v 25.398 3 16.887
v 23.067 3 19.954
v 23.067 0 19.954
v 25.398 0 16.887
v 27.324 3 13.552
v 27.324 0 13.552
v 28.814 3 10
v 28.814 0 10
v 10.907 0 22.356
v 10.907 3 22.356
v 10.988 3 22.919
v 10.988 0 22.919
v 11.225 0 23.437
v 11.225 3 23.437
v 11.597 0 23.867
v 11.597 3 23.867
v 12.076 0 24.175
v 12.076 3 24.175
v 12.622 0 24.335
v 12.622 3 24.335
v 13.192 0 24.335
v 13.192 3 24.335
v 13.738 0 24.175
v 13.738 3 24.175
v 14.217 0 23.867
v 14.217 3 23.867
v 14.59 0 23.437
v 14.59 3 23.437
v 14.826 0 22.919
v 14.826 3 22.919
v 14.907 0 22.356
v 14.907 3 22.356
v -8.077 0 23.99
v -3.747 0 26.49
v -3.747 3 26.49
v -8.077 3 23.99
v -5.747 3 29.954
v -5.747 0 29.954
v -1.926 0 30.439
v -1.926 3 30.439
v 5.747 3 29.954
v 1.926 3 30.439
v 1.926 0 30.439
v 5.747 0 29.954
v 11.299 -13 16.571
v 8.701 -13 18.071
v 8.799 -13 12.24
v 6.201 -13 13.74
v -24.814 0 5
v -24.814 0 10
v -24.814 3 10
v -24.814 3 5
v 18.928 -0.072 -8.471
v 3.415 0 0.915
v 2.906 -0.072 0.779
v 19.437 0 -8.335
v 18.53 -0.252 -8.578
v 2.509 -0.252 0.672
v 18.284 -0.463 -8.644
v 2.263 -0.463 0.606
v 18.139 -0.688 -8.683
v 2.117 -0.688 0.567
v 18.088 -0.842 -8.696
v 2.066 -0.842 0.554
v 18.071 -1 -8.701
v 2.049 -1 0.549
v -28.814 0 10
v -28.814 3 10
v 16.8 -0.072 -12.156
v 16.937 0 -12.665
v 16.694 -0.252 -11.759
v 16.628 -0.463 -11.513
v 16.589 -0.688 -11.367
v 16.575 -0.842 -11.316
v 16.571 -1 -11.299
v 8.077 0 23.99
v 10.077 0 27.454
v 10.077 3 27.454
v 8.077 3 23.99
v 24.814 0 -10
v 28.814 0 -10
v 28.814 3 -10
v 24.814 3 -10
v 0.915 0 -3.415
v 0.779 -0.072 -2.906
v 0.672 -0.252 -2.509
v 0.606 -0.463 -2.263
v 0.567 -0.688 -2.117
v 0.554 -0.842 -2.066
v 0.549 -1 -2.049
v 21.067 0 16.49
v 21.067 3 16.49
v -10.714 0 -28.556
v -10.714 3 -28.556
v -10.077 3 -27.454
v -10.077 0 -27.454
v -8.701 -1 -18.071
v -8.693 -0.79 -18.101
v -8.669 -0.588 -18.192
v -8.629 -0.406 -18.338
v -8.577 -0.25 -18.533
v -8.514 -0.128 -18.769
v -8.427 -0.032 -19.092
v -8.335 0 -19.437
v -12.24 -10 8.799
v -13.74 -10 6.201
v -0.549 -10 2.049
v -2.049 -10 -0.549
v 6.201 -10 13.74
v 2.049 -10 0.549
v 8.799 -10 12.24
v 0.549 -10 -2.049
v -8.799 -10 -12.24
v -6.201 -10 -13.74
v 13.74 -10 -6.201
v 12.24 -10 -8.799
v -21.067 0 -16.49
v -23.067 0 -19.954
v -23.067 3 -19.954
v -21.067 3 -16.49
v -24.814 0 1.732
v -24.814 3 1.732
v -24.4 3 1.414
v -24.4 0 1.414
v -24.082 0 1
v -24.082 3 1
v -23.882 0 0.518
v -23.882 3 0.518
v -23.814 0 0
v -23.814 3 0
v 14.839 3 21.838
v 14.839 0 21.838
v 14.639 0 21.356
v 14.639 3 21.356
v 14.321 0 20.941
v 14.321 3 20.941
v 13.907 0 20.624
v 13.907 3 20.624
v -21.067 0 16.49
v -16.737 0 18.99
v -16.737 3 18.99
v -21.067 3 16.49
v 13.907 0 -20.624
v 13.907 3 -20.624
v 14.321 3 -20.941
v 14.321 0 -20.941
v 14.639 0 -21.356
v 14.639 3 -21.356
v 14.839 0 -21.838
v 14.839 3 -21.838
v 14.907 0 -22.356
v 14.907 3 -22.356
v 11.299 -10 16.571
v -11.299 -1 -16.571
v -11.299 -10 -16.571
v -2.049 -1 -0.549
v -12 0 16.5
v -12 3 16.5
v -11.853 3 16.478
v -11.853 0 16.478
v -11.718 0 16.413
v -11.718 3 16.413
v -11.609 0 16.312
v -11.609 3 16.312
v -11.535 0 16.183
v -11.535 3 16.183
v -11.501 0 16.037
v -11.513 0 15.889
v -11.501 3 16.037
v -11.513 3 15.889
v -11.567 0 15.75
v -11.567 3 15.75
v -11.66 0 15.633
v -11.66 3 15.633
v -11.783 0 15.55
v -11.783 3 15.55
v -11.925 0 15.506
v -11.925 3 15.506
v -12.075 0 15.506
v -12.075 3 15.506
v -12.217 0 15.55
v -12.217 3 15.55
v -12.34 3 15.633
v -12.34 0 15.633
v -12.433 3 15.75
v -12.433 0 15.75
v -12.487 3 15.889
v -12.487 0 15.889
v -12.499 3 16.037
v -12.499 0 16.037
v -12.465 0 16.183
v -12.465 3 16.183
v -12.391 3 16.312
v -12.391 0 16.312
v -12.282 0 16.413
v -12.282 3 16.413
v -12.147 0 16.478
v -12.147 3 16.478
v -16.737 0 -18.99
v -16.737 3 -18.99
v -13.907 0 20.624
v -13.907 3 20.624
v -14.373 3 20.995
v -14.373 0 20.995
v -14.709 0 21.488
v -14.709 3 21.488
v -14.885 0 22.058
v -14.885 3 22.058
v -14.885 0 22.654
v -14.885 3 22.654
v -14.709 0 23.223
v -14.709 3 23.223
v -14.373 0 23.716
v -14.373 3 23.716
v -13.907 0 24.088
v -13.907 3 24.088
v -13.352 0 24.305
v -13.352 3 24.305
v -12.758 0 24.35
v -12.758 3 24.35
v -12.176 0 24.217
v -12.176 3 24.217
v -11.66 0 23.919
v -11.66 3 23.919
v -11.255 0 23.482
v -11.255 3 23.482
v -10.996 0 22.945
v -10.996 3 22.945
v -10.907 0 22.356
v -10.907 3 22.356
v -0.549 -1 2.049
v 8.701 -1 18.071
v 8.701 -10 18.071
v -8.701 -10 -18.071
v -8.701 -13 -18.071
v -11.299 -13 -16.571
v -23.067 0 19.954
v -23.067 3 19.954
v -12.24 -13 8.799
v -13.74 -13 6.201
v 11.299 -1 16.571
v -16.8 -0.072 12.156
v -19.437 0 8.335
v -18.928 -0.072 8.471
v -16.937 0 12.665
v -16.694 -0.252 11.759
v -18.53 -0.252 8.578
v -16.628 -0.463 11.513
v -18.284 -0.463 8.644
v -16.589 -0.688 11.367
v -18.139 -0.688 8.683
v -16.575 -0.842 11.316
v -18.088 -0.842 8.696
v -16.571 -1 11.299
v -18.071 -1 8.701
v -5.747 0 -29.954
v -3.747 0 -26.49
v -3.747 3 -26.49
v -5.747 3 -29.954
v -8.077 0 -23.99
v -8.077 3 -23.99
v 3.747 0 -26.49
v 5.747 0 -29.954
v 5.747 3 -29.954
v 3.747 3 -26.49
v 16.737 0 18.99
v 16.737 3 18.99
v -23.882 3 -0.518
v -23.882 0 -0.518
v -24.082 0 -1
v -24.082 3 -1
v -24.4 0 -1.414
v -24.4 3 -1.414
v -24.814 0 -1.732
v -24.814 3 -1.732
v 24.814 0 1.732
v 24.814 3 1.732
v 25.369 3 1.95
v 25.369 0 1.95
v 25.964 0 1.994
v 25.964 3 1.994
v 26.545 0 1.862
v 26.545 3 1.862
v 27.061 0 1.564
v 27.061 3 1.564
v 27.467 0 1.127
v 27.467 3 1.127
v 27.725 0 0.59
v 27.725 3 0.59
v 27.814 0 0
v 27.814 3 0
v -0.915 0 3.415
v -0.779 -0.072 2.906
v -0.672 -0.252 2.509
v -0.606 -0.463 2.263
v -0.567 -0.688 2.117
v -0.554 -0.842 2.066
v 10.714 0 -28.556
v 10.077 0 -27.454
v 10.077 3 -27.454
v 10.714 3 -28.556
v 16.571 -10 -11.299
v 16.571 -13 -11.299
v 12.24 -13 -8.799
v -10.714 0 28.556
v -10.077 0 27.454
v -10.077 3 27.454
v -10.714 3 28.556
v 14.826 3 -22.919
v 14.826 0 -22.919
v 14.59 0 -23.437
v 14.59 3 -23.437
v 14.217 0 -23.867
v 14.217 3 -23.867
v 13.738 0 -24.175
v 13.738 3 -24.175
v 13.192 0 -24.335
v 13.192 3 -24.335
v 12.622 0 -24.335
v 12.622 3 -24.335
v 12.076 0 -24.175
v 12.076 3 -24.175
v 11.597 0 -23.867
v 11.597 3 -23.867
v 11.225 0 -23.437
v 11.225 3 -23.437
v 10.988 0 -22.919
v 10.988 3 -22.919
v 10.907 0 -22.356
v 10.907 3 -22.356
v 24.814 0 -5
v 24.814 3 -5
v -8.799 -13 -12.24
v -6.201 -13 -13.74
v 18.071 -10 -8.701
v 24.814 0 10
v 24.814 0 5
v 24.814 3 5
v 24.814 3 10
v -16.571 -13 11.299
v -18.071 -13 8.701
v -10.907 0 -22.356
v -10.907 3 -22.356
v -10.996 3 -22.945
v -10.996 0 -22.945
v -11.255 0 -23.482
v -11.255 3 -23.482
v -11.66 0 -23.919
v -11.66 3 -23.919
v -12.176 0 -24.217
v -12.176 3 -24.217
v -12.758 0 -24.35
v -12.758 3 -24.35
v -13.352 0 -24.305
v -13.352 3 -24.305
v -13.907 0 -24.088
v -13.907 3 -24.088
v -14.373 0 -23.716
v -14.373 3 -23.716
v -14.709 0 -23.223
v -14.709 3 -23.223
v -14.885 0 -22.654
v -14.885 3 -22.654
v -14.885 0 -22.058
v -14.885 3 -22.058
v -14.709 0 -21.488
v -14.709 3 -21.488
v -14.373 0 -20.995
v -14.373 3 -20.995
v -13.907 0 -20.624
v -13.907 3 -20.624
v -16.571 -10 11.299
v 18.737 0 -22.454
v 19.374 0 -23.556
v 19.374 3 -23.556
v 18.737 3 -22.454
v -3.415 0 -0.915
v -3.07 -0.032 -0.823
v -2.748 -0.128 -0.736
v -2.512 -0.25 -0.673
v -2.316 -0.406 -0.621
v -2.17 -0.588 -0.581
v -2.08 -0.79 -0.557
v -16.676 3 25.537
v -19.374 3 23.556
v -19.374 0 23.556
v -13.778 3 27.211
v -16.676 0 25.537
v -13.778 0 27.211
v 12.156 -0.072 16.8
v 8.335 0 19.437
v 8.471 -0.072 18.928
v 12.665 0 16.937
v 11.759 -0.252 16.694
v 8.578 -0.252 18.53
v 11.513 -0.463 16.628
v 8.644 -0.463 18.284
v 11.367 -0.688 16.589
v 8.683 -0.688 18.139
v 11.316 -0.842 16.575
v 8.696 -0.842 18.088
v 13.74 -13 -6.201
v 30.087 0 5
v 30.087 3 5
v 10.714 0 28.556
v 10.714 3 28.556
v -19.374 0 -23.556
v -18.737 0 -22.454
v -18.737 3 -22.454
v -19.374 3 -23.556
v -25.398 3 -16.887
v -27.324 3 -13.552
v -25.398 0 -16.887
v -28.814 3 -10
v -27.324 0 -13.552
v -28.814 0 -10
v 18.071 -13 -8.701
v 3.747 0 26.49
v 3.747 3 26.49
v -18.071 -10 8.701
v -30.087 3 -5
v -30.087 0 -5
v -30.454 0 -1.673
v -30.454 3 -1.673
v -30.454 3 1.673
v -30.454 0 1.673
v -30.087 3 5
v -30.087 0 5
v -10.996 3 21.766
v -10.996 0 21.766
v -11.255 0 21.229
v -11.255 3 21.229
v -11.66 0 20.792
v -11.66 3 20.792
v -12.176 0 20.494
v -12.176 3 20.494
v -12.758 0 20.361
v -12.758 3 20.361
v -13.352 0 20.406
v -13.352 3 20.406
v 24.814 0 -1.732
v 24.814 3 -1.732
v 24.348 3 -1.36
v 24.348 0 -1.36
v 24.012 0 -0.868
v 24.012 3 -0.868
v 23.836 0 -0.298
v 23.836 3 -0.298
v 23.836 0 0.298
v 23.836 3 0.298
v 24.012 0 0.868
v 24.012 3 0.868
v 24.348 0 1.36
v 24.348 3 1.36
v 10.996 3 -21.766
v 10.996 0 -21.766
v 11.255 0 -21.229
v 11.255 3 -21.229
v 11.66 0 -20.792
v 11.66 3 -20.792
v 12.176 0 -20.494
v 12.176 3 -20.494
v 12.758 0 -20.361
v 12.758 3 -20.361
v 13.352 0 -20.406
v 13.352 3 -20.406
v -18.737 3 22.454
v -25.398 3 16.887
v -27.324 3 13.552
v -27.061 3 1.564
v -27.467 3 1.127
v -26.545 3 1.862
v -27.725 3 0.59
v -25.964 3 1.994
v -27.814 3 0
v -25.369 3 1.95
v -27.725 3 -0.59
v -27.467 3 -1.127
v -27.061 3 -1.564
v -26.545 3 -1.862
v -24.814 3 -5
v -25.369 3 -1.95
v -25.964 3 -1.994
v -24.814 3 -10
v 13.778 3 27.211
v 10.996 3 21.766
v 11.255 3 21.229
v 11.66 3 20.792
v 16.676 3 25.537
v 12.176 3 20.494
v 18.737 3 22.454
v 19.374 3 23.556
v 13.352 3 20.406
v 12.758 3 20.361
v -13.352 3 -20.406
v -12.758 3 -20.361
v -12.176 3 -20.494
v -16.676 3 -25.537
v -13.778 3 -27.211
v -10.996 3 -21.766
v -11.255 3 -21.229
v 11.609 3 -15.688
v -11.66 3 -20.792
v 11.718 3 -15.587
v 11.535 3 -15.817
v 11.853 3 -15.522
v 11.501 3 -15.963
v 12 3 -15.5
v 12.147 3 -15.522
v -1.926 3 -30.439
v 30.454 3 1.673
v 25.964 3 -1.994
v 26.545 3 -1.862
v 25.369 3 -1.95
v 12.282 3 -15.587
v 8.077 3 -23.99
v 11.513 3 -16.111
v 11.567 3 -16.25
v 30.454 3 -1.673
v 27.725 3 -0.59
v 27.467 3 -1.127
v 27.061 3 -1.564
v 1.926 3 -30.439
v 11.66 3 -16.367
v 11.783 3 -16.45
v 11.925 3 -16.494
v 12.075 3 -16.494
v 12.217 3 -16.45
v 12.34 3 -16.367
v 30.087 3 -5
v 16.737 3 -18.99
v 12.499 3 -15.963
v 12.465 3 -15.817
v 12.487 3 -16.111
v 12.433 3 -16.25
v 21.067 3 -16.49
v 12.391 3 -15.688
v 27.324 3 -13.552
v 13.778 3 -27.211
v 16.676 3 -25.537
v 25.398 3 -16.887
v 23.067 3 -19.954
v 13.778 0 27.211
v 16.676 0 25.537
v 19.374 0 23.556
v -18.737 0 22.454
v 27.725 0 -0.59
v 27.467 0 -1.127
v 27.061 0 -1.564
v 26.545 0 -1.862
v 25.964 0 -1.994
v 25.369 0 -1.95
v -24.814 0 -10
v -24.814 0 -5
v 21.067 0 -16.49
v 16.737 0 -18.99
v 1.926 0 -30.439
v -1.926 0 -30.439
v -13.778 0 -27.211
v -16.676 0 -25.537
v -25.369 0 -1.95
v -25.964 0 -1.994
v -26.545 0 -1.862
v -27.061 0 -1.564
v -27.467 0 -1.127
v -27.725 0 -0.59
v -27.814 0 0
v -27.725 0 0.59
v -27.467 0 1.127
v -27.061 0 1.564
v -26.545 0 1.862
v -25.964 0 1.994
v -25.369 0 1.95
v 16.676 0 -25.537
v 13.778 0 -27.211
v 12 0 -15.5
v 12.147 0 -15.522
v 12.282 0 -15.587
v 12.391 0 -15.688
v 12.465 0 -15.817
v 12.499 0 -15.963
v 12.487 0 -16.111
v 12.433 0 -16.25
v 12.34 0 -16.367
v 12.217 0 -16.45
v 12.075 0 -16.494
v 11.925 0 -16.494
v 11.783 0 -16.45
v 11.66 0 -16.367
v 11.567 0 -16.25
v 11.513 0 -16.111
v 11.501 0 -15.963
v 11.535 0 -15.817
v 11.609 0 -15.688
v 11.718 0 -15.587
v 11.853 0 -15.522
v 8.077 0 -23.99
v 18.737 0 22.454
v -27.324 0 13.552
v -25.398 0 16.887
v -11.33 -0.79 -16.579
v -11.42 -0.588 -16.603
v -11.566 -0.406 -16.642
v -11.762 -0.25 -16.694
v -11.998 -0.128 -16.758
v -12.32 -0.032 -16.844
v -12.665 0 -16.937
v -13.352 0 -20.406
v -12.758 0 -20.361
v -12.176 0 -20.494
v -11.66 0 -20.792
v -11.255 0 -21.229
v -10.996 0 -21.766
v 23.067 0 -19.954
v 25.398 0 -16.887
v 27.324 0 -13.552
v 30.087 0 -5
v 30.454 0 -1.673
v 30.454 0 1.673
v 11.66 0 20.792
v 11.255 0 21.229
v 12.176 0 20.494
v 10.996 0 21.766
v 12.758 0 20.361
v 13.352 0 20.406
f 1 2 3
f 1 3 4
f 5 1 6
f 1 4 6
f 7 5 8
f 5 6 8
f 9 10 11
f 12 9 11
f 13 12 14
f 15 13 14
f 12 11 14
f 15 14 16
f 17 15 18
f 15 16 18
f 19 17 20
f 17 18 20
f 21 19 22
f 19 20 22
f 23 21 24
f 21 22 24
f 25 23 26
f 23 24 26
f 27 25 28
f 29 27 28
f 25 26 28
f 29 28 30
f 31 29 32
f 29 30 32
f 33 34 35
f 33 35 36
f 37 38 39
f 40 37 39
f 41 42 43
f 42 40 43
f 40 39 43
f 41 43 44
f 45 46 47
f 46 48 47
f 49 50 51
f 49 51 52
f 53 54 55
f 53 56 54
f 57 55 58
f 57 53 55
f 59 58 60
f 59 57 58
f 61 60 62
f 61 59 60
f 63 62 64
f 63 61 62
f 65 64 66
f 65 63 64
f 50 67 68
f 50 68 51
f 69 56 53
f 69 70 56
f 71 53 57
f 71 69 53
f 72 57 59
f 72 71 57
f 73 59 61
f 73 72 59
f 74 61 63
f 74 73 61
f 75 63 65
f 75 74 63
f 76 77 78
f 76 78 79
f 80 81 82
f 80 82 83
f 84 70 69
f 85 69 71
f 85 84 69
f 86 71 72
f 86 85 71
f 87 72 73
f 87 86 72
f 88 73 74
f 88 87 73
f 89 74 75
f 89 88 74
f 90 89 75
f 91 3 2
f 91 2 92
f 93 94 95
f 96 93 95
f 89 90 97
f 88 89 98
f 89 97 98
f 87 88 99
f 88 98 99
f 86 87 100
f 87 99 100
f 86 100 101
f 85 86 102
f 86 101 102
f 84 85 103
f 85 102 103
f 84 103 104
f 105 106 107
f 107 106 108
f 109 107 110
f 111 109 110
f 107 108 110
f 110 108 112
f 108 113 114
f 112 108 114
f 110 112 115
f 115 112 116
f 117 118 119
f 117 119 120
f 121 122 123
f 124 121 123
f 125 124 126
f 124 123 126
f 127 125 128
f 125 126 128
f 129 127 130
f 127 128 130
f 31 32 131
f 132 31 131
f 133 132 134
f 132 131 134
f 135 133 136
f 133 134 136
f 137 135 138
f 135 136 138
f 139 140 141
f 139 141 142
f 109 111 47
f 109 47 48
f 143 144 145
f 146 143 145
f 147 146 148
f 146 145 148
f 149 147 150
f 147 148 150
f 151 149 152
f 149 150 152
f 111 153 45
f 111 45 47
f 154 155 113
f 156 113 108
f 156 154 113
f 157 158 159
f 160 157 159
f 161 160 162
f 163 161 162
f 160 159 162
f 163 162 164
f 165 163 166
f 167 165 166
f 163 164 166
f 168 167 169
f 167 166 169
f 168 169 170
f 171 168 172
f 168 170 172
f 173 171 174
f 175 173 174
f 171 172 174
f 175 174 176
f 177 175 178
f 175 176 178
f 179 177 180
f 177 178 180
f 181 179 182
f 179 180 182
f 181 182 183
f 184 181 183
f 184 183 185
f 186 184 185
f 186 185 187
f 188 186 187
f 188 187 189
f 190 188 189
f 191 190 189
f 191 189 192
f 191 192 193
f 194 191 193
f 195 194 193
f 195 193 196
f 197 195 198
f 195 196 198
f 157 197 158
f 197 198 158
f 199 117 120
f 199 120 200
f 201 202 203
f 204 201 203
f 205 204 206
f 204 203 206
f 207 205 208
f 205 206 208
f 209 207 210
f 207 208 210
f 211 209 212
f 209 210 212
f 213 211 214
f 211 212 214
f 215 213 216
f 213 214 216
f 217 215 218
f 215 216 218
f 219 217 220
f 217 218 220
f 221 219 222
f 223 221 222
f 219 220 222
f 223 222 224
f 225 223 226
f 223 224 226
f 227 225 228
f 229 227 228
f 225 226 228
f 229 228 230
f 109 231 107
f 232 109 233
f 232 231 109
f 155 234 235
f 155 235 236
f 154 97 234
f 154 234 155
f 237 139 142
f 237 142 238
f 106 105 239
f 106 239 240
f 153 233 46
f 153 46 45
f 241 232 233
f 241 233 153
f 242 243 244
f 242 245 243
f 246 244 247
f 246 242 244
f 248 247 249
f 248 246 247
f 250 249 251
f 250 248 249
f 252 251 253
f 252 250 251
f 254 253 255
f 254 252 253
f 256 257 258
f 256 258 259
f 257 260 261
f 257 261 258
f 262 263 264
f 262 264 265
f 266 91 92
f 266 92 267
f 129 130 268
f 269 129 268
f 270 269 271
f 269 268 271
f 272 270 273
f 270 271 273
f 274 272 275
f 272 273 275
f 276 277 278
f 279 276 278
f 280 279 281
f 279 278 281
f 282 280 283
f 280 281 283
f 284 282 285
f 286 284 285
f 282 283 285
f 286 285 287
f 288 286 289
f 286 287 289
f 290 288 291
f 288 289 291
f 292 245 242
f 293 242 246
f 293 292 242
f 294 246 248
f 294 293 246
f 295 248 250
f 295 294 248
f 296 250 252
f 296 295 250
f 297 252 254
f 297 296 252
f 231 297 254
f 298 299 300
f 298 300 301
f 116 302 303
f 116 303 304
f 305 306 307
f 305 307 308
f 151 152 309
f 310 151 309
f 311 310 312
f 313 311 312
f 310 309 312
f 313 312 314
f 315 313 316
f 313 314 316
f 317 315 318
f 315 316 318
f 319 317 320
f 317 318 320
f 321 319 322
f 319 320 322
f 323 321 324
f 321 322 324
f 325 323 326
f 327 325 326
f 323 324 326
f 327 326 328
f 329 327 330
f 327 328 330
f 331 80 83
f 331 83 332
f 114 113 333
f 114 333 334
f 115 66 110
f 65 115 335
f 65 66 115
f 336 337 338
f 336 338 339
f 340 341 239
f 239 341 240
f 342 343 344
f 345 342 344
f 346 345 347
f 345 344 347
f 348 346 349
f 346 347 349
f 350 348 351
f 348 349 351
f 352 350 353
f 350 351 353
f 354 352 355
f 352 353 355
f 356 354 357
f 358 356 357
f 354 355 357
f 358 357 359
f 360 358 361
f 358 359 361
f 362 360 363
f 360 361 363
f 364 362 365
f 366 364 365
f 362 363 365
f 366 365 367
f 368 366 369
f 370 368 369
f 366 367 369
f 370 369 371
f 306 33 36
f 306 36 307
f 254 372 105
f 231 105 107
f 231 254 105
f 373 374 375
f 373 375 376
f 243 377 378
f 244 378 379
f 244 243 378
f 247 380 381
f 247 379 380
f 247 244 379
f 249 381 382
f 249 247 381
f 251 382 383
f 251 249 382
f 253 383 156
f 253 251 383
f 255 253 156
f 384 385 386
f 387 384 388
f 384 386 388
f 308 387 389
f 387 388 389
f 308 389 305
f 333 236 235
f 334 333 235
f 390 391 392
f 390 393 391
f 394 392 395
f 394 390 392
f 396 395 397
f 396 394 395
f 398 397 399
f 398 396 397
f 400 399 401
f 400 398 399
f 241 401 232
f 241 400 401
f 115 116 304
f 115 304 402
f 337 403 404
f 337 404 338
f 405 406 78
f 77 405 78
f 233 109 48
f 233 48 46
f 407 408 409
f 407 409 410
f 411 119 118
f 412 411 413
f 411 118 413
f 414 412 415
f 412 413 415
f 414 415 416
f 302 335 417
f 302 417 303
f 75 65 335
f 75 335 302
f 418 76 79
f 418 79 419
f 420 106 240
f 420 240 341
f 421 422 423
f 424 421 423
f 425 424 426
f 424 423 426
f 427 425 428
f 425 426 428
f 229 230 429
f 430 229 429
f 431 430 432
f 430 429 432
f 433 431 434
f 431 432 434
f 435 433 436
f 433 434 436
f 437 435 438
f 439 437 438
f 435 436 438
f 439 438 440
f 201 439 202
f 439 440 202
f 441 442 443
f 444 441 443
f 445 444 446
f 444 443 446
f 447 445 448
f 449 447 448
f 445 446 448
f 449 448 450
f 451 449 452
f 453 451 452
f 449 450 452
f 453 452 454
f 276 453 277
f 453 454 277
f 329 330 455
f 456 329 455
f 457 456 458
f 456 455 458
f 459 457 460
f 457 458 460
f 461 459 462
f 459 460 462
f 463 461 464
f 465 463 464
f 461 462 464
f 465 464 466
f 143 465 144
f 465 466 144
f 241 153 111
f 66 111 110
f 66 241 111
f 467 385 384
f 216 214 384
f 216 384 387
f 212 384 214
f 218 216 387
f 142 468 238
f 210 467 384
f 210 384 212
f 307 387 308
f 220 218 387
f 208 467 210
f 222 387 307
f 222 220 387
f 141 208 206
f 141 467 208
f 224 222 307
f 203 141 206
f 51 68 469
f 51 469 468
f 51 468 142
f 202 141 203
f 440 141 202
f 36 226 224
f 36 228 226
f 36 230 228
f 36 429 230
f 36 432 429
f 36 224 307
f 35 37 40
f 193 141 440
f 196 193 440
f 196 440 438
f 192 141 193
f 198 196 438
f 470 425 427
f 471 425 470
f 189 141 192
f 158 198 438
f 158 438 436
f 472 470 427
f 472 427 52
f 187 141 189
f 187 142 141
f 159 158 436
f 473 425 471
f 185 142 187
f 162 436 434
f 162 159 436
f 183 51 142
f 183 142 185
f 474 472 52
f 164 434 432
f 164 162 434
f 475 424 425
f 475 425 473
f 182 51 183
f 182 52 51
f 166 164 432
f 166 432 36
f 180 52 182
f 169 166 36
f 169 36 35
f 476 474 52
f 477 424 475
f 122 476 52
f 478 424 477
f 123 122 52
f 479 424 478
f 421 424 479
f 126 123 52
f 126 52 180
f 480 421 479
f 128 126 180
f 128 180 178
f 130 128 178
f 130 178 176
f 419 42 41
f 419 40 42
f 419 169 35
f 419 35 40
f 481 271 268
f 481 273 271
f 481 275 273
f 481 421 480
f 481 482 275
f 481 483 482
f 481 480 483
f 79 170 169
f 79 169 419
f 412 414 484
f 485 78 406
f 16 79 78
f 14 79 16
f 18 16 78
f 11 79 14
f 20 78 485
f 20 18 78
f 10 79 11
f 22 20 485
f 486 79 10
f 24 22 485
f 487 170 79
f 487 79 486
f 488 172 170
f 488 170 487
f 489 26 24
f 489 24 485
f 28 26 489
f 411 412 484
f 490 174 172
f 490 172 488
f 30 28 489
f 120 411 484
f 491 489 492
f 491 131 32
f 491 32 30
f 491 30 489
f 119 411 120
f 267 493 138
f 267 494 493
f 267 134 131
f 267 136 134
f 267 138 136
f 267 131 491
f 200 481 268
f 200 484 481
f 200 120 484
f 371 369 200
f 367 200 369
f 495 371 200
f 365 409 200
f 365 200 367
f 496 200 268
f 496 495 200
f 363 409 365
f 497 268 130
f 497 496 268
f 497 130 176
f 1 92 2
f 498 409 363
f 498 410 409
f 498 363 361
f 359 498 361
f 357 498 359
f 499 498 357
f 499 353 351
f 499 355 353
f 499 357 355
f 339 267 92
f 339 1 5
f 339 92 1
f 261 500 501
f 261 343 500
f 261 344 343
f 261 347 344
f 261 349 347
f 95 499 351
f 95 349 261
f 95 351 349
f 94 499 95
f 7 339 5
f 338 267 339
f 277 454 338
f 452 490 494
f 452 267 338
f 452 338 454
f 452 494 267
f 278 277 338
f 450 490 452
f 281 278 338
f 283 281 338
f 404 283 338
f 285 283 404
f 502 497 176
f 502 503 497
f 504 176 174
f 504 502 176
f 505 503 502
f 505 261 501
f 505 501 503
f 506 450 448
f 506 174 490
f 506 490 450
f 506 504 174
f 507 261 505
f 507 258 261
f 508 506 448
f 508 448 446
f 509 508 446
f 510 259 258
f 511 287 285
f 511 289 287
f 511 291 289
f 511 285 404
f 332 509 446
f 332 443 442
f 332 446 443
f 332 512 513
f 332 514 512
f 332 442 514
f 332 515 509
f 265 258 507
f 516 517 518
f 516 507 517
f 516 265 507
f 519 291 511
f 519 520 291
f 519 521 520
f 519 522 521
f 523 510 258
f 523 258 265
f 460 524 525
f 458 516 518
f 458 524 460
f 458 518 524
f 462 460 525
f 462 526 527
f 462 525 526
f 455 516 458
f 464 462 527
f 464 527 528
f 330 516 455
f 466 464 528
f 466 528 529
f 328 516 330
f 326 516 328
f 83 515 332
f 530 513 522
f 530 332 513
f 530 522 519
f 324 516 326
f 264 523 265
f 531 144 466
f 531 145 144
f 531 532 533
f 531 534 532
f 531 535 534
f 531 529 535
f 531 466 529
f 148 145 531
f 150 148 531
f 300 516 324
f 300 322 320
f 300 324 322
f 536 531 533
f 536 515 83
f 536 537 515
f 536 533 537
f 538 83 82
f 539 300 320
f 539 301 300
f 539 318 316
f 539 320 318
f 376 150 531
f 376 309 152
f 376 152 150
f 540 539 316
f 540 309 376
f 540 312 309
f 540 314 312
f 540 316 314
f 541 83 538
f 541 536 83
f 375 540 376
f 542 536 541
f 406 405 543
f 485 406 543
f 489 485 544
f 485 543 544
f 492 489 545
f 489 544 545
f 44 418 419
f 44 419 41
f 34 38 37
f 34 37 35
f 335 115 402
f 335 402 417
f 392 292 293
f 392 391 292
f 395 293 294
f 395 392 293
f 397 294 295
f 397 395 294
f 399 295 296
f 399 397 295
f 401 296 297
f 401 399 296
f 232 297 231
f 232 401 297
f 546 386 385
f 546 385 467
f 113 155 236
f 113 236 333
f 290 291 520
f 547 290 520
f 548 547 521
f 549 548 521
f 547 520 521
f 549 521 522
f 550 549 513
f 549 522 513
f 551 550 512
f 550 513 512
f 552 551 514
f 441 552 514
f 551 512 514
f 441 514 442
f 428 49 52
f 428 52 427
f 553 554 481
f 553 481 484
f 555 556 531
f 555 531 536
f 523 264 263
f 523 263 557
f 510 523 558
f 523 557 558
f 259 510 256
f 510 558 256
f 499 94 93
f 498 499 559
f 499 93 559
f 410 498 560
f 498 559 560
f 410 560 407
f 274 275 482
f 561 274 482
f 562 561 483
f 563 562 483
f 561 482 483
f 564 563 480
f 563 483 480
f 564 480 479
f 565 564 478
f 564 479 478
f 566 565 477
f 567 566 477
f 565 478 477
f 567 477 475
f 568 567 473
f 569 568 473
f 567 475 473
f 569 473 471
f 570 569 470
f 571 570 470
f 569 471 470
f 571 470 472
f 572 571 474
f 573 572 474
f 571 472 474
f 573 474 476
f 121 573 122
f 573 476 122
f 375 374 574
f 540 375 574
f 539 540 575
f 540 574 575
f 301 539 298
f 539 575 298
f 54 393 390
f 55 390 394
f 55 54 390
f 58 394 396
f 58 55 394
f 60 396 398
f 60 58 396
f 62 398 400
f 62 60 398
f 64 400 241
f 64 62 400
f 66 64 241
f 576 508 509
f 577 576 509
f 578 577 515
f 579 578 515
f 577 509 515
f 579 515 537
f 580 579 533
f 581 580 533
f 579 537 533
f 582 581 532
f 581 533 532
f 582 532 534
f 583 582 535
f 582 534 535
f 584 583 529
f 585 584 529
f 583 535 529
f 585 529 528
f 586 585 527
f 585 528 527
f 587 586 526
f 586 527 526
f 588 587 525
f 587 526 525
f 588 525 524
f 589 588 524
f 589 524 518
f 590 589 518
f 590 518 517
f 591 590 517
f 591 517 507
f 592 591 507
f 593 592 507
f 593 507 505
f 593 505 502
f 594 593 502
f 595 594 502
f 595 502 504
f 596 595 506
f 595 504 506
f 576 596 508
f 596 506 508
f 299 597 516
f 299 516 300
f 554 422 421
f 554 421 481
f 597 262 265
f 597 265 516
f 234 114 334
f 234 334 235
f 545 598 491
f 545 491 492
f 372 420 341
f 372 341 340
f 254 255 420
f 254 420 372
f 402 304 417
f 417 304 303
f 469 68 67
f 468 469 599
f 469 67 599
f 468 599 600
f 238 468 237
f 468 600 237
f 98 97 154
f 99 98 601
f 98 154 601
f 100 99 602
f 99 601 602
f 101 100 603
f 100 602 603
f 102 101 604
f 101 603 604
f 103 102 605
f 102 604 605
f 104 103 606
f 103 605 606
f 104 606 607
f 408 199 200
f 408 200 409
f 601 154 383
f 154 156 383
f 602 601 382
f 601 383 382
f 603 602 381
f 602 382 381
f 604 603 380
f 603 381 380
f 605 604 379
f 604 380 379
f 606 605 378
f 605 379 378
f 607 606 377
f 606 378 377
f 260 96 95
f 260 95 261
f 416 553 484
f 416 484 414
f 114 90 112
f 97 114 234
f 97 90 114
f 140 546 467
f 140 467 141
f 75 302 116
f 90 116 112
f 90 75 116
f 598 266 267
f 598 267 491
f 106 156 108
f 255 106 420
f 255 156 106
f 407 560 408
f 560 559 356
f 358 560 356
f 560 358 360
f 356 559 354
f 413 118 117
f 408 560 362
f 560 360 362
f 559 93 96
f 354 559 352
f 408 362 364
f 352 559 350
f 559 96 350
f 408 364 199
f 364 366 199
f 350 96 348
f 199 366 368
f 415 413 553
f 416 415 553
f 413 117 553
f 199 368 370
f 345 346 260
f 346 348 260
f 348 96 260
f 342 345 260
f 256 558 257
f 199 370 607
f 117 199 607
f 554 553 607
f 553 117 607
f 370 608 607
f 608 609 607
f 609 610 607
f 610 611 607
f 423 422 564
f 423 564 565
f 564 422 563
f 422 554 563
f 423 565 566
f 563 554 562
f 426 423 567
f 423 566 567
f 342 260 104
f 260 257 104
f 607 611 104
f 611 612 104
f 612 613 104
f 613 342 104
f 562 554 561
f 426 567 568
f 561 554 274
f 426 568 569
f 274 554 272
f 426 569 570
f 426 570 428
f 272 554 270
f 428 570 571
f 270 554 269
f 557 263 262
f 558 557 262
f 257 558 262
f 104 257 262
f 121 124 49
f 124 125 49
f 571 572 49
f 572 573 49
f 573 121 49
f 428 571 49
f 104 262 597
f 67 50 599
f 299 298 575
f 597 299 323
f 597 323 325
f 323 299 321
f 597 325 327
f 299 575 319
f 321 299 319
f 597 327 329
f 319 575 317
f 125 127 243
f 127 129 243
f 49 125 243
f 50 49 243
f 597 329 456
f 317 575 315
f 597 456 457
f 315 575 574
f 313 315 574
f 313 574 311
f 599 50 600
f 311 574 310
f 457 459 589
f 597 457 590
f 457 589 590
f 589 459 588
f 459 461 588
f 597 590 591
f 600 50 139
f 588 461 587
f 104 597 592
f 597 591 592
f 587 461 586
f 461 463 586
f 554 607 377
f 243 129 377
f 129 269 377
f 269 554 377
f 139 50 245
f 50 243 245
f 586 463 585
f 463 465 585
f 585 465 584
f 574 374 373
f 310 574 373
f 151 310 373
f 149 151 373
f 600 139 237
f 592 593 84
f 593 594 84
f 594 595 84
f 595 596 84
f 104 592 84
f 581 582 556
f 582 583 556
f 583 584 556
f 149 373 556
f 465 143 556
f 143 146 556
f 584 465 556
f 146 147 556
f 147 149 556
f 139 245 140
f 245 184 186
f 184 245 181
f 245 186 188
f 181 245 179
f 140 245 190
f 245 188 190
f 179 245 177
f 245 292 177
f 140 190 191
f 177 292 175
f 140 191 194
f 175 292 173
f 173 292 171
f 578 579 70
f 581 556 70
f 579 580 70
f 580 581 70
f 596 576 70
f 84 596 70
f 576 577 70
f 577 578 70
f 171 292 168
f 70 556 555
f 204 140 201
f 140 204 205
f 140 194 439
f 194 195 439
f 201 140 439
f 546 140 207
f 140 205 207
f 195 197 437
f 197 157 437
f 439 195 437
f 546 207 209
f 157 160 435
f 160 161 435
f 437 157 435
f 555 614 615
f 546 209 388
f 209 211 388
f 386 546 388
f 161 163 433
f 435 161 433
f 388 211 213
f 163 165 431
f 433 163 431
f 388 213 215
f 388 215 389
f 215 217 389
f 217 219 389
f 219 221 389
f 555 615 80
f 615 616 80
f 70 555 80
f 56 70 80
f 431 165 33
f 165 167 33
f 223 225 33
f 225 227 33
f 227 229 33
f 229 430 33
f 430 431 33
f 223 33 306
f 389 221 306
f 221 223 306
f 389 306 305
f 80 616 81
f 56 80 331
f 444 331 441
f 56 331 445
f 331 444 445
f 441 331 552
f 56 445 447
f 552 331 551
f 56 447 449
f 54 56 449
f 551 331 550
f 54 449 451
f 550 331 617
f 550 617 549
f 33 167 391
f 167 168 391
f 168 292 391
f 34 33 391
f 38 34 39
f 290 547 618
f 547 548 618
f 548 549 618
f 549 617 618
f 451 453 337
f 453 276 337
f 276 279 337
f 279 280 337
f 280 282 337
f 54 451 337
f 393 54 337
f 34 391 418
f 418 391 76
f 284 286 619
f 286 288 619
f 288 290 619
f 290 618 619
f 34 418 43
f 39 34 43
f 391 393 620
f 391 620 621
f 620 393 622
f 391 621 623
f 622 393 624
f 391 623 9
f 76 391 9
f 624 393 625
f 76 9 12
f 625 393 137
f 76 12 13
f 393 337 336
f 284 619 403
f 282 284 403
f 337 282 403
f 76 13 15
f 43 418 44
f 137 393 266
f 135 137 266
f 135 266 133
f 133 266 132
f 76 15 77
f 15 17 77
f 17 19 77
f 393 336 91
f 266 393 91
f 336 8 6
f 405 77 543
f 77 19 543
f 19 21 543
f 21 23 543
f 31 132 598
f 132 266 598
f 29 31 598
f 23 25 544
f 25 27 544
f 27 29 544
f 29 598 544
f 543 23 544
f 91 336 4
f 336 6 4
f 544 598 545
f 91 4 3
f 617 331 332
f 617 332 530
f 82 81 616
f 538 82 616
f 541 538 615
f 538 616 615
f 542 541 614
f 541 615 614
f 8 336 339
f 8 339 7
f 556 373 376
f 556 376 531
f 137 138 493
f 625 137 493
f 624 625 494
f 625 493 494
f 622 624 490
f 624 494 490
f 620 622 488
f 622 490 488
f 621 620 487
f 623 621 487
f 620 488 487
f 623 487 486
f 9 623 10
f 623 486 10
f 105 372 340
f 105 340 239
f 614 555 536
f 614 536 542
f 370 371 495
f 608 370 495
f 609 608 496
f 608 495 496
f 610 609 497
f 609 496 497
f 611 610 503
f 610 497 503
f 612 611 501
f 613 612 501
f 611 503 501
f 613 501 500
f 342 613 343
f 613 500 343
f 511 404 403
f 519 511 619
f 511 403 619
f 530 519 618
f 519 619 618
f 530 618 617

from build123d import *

# Parameters (mm, degrees)
CROQUIS1_R              = 30.5
SALIENTE_EXTRUIR1_DEPTH = 3
CORTAR_EXTRUIR3_START   = -4
CORTAR_EXTRUIR3_DEPTH   = 4
CORTAR_EXTRUIR4_DEPTH   = 10
CROQUIS8_R              = 0.5
CORTAR_EXTRUIR5_DEPTH   = 3
SALIENTE_EXTRUIR2_DEPTH = 13
SALIENTE_EXTRUIR3_DEPTH = 3
REDONDEO1_R             = 1


with BuildPart() as part:
    # Croquis1 → Saliente-Extruir1 (new body)
    with BuildSketch(Plane(origin=(0, 0, 0), x_dir=(1, 0, 0), z_dir=(0, 1, 0))):
        with Locations(Location((0, 0, 0), (0, 0, 270))):
            Circle(CROQUIS1_R)
    extrude(amount=SALIENTE_EXTRUIR1_DEPTH)

    # Croquis5 → Cortar-Extruir3 (cut)
    with BuildSketch(Plane(origin=(0, 3, 0), x_dir=(1, 0, 0), z_dir=(0, 1, 0)).offset(CORTAR_EXTRUIR3_START)):
        with BuildLine():
            ThreePointArc((-28.814059068, 10), (-29.556634924, 7.526973624), (-30.087372767, 5))
            Line((-30.087372767, 5), (-28.814059068, 5))
            Line((-28.814059068, 5), (-24.814059068, 5))
            Line((-24.814059068, 5), (-24.814059068, 10))
            Line((-24.814059068, 10), (-28.814059068, 10))
        make_face()
        with BuildLine():
            Line((28.814059068, 5), (30.087372767, 5))
            ThreePointArc((30.087372767, 5), (29.556634924, 7.526973624), (28.814059068, 10))
            Line((28.814059068, 10), (24.814059068, 10))
            Line((24.814059068, 10), (24.814059068, 5))
            Line((24.814059068, 5), (28.814059068, 5))
        make_face()
        with BuildLine():
            Line((30.087372767, -5), (28.814059068, -5))
            Line((28.814059068, -5), (24.814059068, -5))
            Line((24.814059068, -5), (24.814059068, -10))
            Line((24.814059068, -10), (28.814059068, -10))
            ThreePointArc((28.814059068, -10), (29.556634924, -7.526973624), (30.087372767, -5))
        make_face()
        with BuildLine():
            ThreePointArc((19.373813402, -23.556429149), (21.296867835, -21.833309883), (23.067283572, -19.953707139))
            Line((23.067283572, -19.953707139), (21.067283572, -16.489605524))
            Line((21.067283572, -16.489605524), (16.737156553, -18.989605524))
            Line((16.737156553, -18.989605524), (18.737156553, -22.453707139))
            Line((18.737156553, -22.453707139), (19.373813402, -23.556429149))
        make_face()
        with BuildLine():
            ThreePointArc((5.746775496, -29.953707139), (8.25976709, -29.360283507), (10.713559364, -28.556429149))
            Line((10.713559364, -28.556429149), (10.076902515, -27.453707139))
            Line((10.076902515, -27.453707139), (8.076902515, -23.989605524))
            Line((8.076902515, -23.989605524), (3.746775496, -26.489605524))
            Line((3.746775496, -26.489605524), (5.746775496, -29.953707139))
        make_face()
        with BuildLine():
            ThreePointArc((-10.713559364, -28.556429149), (-8.25976709, -29.360283507), (-5.746775496, -29.953707139))
            Line((-5.746775496, -29.953707139), (-3.746775496, -26.489605524))
            Line((-3.746775496, -26.489605524), (-8.076902515, -23.989605524))
            Line((-8.076902515, -23.989605524), (-10.076902515, -27.453707139))
            Line((-10.076902515, -27.453707139), (-10.713559364, -28.556429149))
        make_face()
        with BuildLine():
            ThreePointArc((-23.067283572, -19.953707139), (-21.296867835, -21.833309883), (-19.373813402, -23.556429149))
            Line((-19.373813402, -23.556429149), (-18.737156553, -22.453707139))
            Line((-18.737156553, -22.453707139), (-16.737156553, -18.989605524))
            Line((-16.737156553, -18.989605524), (-21.067283572, -16.489605524))
            Line((-21.067283572, -16.489605524), (-23.067283572, -19.953707139))
        make_face()
        with BuildLine():
            ThreePointArc((-30.087372767, -5), (-29.556634924, -7.526973624), (-28.814059068, -10))
            Line((-28.814059068, -10), (-24.814059068, -10))
            Line((-24.814059068, -10), (-24.814059068, -5))
            Line((-24.814059068, -5), (-28.814059068, -5))
            Line((-28.814059068, -5), (-30.087372767, -5))
        make_face()
        with BuildLine():
            Line((-18.737156553, 22.453707139), (-19.373813402, 23.556429149))
            ThreePointArc((-19.373813402, 23.556429149), (-21.296867835, 21.833309883), (-23.067283572, 19.953707139))
            Line((-23.067283572, 19.953707139), (-21.067283572, 16.489605524))
            Line((-21.067283572, 16.489605524), (-16.737156553, 18.989605524))
            Line((-16.737156553, 18.989605524), (-18.737156553, 22.453707139))
        make_face()
        with BuildLine():
            Line((-3.746775496, 26.489605524), (-5.746775496, 29.953707139))
            ThreePointArc((-5.746775496, 29.953707139), (-8.25976709, 29.360283507), (-10.713559364, 28.556429149))
            Line((-10.713559364, 28.556429149), (-10.076902515, 27.453707139))
            Line((-10.076902515, 27.453707139), (-8.076902515, 23.989605524))
            Line((-8.076902515, 23.989605524), (-3.746775496, 26.489605524))
        make_face()
        with BuildLine():
            Line((10.076902515, 27.453707139), (10.713559364, 28.556429149))
            ThreePointArc((10.713559364, 28.556429149), (8.25976709, 29.360283507), (5.746775496, 29.953707139))
            Line((5.746775496, 29.953707139), (3.746775496, 26.489605524))
            Line((3.746775496, 26.489605524), (8.076902515, 23.989605524))
            Line((8.076902515, 23.989605524), (10.076902515, 27.453707139))
        make_face()
        with BuildLine():
            Line((21.067283572, 16.489605524), (23.067283572, 19.953707139))
            ThreePointArc((23.067283572, 19.953707139), (21.296867835, 21.833309883), (19.373813402, 23.556429149))
            Line((19.373813402, 23.556429149), (18.737156553, 22.453707139))
            Line((18.737156553, 22.453707139), (16.737156553, 18.989605524))
            Line((16.737156553, 18.989605524), (21.067283572, 16.489605524))
        make_face()
    extrude(amount=CORTAR_EXTRUIR3_DEPTH, mode=Mode.SUBTRACT)

    # Croquis7 → Cortar-Extruir4 (cut)
    with BuildSketch(Plane(origin=(0, 3, 0), x_dir=(1, 0, 0), z_dir=(0, 1, 0))):
        with BuildLine():
            ThreePointArc((-13.907029535, 20.623580122), (-11.907029535, 20.623580122), (-10.907029535, 22.355630929))
            Line((-10.907029535, 22.355630929), (-12.907029535, 22.355630929))
            Line((-12.907029535, 22.355630929), (-13.907029535, 20.623580122))
        make_face()
        with BuildLine():
            Line((-12.907029535, 22.355630929), (-10.907029535, 22.355630929))
            ThreePointArc((-10.907029535, 22.355630929), (-13.907029535, 24.087681737), (-13.907029535, 20.623580122))
            Line((-13.907029535, 20.623580122), (-12.907029535, 22.355630929))
        make_face()
        with BuildLine():
            ThreePointArc((-23.81405907, 0), (-24.082008262, 1), (-24.81405907, 1.732050808))
            Line((-24.81405907, 1.732050808), (-25.81405907, 0))
            Line((-25.81405907, 0), (-24.81405907, -1.732050808))
            ThreePointArc((-24.81405907, -1.732050808), (-24.082008262, -1), (-23.81405907, 0))
        make_face()
        with BuildLine():
            Line((-25.81405907, 0), (-24.81405907, 1.732050808))
            ThreePointArc((-24.81405907, 1.732050808), (-27.81405907, 0), (-24.81405907, -1.732050808))
            Line((-24.81405907, -1.732050808), (-25.81405907, 0))
        make_face()
        with BuildLine():
            ThreePointArc((10.907029535, 22.355630929), (11.907029535, 20.623580122), (13.907029535, 20.623580122))
            Line((13.907029535, 20.623580122), (12.907029535, 22.355630929))
            Line((12.907029535, 22.355630929), (10.907029535, 22.355630929))
        make_face()
        with BuildLine():
            Line((12.907029535, 22.355630929), (13.907029535, 20.623580122))
            ThreePointArc((13.907029535, 20.623580122), (14.639080343, 21.355630929), (14.907029535, 22.355630929))
            ThreePointArc((14.907029535, 22.355630929), (12.907029535, 24.355630929), (10.907029535, 22.355630929))
            Line((10.907029535, 22.355630929), (12.907029535, 22.355630929))
        make_face()
        with BuildLine():
            Line((24.81405907, -1.732050808), (25.81405907, 0))
            Line((25.81405907, 0), (24.81405907, 1.732050808))
            ThreePointArc((24.81405907, 1.732050808), (23.81405907, 0), (24.81405907, -1.732050808))
        make_face()
        with BuildLine():
            Line((24.81405907, 1.732050808), (25.81405907, 0))
            Line((25.81405907, 0), (24.81405907, -1.732050808))
            ThreePointArc((24.81405907, -1.732050808), (26.81405907, -1.732050808), (27.81405907, 0))
            ThreePointArc((27.81405907, 0), (26.81405907, 1.732050808), (24.81405907, 1.732050808))
        make_face()
        with BuildLine():
            ThreePointArc((-13.907029535, -20.623580122), (-13.907029535, -24.087681737), (-10.907029535, -22.355630929))
            Line((-10.907029535, -22.355630929), (-12.907029535, -22.355630929))
            Line((-12.907029535, -22.355630929), (-13.907029535, -20.623580122))
        make_face()
        with BuildLine():
            Line((-12.907029535, -22.355630929), (-10.907029535, -22.355630929))
            ThreePointArc((-10.907029535, -22.355630929), (-11.907029535, -20.623580122), (-13.907029535, -20.623580122))
            Line((-13.907029535, -20.623580122), (-12.907029535, -22.355630929))
        make_face()
        with BuildLine():
            ThreePointArc((14.907029535, -22.355630929), (14.639080343, -21.355630929), (13.907029535, -20.623580122))
            Line((13.907029535, -20.623580122), (12.907029535, -22.355630929))
            Line((12.907029535, -22.355630929), (10.907029535, -22.355630929))
            ThreePointArc((10.907029535, -22.355630929), (12.907029535, -24.355630929), (14.907029535, -22.355630929))
        make_face()
        with BuildLine():
            Line((12.907029535, -22.355630929), (13.907029535, -20.623580122))
            ThreePointArc((13.907029535, -20.623580122), (11.907029535, -20.623580122), (10.907029535, -22.355630929))
            Line((10.907029535, -22.355630929), (12.907029535, -22.355630929))
        make_face()
    extrude(amount=-CORTAR_EXTRUIR4_DEPTH, mode=Mode.SUBTRACT)

    # Croquis8 → Cortar-Extruir5 (cut)
    with BuildSketch(Plane(origin=(0, 3, 0), x_dir=(1, 0, 0), z_dir=(0, 1, 0))):
        with Locations(Location((12, 16, 0), (0, 0, 270))):
            Circle(CROQUIS8_R)
        with Locations(Location((-12, -16, 0), (0, 0, 270))):
            Circle(CROQUIS8_R)
    extrude(amount=-CORTAR_EXTRUIR5_DEPTH, mode=Mode.SUBTRACT)

    # Croquis9 → Saliente-Extruir2 (add)
    with BuildSketch(Plane(origin=(0, 3, 0), x_dir=(1, 0, 0), z_dir=(0, 1, 0))):
        Polygon((-0.549038106, -2.049038106), (-2.049038106, 0.549038106), (-18.070508076, -8.700961894), (-17.320508076, -10), (-16.570508076, -11.299038106), align=None)
        Polygon((2.049038106, -0.549038106), (0.549038106, 2.049038106), (-2.049038106, 0.549038106), (-0.549038106, -2.049038106), align=None)
        Polygon((-2.049038106, 0.549038106), (0.549038106, 2.049038106), (-8.700961894, 18.070508076), (-10, 17.320508076), (-11.299038106, 16.570508076), align=None)
        Polygon((17.320508076, 10), (16.570508076, 11.299038106), (0.549038106, 2.049038106), (2.049038106, -0.549038106), (18.070508076, 8.700961894), align=None)
        Polygon((11.299038106, -16.570508076), (2.049038106, -0.549038106), (-0.549038106, -2.049038106), (8.700961894, -18.070508076), (10, -17.320508076), align=None)
    extrude(amount=-SALIENTE_EXTRUIR2_DEPTH)

    # Croquis10 → Saliente-Extruir3 (add)
    with BuildSketch(Plane(origin=(0, -10, 0), x_dir=(-1, 0, 0), z_dir=(0, -1, 0))):
        Polygon((8.700961894, 18.070508076), (11.299038106, 16.570508076), (8.799038106, 12.240381057), (6.200961894, 13.740381057), align=None)
        Polygon((-12.240381057, 8.799038106), (-13.740381057, 6.200961894), (-18.070508076, 8.700961894), (-16.570508076, 11.299038106), align=None)
        Polygon((-8.700961894, -18.070508076), (-11.299038106, -16.570508076), (-8.799038106, -12.240381057), (-6.200961894, -13.740381057), align=None)
        Polygon((12.240381057, -8.799038106), (13.740381057, -6.200961894), (18.070508076, -8.700961894), (16.570508076, -11.299038106), align=None)
    extrude(amount=SALIENTE_EXTRUIR3_DEPTH)

    # Redondeo1
    redondeo1_edges = [part.edges().sort_by_distance(p)[0] for p in [
        (-8.559773091, 0, 6.674038106),
        (4.075961894, 0, 10.059773091),
        (10, 0, 17.320508076),
        (6.674038106, 0, 8.559773091),
        (10.059773091, 0, -4.075961894),
        (17.320508076, 0, -10),
        (8.559773091, 0, -6.674038106),
        (-4.075961894, 0, -10.059773091),
        (-10, 0, -17.320508076),
        (-6.674038106, 0, -8.559773091),
        (-10.059773091, 0, 4.075961894),
        (-17.320508076, 0, 10),
    ]]
    fillet(redondeo1_edges, radius=REDONDEO1_R)


solid = part.part
